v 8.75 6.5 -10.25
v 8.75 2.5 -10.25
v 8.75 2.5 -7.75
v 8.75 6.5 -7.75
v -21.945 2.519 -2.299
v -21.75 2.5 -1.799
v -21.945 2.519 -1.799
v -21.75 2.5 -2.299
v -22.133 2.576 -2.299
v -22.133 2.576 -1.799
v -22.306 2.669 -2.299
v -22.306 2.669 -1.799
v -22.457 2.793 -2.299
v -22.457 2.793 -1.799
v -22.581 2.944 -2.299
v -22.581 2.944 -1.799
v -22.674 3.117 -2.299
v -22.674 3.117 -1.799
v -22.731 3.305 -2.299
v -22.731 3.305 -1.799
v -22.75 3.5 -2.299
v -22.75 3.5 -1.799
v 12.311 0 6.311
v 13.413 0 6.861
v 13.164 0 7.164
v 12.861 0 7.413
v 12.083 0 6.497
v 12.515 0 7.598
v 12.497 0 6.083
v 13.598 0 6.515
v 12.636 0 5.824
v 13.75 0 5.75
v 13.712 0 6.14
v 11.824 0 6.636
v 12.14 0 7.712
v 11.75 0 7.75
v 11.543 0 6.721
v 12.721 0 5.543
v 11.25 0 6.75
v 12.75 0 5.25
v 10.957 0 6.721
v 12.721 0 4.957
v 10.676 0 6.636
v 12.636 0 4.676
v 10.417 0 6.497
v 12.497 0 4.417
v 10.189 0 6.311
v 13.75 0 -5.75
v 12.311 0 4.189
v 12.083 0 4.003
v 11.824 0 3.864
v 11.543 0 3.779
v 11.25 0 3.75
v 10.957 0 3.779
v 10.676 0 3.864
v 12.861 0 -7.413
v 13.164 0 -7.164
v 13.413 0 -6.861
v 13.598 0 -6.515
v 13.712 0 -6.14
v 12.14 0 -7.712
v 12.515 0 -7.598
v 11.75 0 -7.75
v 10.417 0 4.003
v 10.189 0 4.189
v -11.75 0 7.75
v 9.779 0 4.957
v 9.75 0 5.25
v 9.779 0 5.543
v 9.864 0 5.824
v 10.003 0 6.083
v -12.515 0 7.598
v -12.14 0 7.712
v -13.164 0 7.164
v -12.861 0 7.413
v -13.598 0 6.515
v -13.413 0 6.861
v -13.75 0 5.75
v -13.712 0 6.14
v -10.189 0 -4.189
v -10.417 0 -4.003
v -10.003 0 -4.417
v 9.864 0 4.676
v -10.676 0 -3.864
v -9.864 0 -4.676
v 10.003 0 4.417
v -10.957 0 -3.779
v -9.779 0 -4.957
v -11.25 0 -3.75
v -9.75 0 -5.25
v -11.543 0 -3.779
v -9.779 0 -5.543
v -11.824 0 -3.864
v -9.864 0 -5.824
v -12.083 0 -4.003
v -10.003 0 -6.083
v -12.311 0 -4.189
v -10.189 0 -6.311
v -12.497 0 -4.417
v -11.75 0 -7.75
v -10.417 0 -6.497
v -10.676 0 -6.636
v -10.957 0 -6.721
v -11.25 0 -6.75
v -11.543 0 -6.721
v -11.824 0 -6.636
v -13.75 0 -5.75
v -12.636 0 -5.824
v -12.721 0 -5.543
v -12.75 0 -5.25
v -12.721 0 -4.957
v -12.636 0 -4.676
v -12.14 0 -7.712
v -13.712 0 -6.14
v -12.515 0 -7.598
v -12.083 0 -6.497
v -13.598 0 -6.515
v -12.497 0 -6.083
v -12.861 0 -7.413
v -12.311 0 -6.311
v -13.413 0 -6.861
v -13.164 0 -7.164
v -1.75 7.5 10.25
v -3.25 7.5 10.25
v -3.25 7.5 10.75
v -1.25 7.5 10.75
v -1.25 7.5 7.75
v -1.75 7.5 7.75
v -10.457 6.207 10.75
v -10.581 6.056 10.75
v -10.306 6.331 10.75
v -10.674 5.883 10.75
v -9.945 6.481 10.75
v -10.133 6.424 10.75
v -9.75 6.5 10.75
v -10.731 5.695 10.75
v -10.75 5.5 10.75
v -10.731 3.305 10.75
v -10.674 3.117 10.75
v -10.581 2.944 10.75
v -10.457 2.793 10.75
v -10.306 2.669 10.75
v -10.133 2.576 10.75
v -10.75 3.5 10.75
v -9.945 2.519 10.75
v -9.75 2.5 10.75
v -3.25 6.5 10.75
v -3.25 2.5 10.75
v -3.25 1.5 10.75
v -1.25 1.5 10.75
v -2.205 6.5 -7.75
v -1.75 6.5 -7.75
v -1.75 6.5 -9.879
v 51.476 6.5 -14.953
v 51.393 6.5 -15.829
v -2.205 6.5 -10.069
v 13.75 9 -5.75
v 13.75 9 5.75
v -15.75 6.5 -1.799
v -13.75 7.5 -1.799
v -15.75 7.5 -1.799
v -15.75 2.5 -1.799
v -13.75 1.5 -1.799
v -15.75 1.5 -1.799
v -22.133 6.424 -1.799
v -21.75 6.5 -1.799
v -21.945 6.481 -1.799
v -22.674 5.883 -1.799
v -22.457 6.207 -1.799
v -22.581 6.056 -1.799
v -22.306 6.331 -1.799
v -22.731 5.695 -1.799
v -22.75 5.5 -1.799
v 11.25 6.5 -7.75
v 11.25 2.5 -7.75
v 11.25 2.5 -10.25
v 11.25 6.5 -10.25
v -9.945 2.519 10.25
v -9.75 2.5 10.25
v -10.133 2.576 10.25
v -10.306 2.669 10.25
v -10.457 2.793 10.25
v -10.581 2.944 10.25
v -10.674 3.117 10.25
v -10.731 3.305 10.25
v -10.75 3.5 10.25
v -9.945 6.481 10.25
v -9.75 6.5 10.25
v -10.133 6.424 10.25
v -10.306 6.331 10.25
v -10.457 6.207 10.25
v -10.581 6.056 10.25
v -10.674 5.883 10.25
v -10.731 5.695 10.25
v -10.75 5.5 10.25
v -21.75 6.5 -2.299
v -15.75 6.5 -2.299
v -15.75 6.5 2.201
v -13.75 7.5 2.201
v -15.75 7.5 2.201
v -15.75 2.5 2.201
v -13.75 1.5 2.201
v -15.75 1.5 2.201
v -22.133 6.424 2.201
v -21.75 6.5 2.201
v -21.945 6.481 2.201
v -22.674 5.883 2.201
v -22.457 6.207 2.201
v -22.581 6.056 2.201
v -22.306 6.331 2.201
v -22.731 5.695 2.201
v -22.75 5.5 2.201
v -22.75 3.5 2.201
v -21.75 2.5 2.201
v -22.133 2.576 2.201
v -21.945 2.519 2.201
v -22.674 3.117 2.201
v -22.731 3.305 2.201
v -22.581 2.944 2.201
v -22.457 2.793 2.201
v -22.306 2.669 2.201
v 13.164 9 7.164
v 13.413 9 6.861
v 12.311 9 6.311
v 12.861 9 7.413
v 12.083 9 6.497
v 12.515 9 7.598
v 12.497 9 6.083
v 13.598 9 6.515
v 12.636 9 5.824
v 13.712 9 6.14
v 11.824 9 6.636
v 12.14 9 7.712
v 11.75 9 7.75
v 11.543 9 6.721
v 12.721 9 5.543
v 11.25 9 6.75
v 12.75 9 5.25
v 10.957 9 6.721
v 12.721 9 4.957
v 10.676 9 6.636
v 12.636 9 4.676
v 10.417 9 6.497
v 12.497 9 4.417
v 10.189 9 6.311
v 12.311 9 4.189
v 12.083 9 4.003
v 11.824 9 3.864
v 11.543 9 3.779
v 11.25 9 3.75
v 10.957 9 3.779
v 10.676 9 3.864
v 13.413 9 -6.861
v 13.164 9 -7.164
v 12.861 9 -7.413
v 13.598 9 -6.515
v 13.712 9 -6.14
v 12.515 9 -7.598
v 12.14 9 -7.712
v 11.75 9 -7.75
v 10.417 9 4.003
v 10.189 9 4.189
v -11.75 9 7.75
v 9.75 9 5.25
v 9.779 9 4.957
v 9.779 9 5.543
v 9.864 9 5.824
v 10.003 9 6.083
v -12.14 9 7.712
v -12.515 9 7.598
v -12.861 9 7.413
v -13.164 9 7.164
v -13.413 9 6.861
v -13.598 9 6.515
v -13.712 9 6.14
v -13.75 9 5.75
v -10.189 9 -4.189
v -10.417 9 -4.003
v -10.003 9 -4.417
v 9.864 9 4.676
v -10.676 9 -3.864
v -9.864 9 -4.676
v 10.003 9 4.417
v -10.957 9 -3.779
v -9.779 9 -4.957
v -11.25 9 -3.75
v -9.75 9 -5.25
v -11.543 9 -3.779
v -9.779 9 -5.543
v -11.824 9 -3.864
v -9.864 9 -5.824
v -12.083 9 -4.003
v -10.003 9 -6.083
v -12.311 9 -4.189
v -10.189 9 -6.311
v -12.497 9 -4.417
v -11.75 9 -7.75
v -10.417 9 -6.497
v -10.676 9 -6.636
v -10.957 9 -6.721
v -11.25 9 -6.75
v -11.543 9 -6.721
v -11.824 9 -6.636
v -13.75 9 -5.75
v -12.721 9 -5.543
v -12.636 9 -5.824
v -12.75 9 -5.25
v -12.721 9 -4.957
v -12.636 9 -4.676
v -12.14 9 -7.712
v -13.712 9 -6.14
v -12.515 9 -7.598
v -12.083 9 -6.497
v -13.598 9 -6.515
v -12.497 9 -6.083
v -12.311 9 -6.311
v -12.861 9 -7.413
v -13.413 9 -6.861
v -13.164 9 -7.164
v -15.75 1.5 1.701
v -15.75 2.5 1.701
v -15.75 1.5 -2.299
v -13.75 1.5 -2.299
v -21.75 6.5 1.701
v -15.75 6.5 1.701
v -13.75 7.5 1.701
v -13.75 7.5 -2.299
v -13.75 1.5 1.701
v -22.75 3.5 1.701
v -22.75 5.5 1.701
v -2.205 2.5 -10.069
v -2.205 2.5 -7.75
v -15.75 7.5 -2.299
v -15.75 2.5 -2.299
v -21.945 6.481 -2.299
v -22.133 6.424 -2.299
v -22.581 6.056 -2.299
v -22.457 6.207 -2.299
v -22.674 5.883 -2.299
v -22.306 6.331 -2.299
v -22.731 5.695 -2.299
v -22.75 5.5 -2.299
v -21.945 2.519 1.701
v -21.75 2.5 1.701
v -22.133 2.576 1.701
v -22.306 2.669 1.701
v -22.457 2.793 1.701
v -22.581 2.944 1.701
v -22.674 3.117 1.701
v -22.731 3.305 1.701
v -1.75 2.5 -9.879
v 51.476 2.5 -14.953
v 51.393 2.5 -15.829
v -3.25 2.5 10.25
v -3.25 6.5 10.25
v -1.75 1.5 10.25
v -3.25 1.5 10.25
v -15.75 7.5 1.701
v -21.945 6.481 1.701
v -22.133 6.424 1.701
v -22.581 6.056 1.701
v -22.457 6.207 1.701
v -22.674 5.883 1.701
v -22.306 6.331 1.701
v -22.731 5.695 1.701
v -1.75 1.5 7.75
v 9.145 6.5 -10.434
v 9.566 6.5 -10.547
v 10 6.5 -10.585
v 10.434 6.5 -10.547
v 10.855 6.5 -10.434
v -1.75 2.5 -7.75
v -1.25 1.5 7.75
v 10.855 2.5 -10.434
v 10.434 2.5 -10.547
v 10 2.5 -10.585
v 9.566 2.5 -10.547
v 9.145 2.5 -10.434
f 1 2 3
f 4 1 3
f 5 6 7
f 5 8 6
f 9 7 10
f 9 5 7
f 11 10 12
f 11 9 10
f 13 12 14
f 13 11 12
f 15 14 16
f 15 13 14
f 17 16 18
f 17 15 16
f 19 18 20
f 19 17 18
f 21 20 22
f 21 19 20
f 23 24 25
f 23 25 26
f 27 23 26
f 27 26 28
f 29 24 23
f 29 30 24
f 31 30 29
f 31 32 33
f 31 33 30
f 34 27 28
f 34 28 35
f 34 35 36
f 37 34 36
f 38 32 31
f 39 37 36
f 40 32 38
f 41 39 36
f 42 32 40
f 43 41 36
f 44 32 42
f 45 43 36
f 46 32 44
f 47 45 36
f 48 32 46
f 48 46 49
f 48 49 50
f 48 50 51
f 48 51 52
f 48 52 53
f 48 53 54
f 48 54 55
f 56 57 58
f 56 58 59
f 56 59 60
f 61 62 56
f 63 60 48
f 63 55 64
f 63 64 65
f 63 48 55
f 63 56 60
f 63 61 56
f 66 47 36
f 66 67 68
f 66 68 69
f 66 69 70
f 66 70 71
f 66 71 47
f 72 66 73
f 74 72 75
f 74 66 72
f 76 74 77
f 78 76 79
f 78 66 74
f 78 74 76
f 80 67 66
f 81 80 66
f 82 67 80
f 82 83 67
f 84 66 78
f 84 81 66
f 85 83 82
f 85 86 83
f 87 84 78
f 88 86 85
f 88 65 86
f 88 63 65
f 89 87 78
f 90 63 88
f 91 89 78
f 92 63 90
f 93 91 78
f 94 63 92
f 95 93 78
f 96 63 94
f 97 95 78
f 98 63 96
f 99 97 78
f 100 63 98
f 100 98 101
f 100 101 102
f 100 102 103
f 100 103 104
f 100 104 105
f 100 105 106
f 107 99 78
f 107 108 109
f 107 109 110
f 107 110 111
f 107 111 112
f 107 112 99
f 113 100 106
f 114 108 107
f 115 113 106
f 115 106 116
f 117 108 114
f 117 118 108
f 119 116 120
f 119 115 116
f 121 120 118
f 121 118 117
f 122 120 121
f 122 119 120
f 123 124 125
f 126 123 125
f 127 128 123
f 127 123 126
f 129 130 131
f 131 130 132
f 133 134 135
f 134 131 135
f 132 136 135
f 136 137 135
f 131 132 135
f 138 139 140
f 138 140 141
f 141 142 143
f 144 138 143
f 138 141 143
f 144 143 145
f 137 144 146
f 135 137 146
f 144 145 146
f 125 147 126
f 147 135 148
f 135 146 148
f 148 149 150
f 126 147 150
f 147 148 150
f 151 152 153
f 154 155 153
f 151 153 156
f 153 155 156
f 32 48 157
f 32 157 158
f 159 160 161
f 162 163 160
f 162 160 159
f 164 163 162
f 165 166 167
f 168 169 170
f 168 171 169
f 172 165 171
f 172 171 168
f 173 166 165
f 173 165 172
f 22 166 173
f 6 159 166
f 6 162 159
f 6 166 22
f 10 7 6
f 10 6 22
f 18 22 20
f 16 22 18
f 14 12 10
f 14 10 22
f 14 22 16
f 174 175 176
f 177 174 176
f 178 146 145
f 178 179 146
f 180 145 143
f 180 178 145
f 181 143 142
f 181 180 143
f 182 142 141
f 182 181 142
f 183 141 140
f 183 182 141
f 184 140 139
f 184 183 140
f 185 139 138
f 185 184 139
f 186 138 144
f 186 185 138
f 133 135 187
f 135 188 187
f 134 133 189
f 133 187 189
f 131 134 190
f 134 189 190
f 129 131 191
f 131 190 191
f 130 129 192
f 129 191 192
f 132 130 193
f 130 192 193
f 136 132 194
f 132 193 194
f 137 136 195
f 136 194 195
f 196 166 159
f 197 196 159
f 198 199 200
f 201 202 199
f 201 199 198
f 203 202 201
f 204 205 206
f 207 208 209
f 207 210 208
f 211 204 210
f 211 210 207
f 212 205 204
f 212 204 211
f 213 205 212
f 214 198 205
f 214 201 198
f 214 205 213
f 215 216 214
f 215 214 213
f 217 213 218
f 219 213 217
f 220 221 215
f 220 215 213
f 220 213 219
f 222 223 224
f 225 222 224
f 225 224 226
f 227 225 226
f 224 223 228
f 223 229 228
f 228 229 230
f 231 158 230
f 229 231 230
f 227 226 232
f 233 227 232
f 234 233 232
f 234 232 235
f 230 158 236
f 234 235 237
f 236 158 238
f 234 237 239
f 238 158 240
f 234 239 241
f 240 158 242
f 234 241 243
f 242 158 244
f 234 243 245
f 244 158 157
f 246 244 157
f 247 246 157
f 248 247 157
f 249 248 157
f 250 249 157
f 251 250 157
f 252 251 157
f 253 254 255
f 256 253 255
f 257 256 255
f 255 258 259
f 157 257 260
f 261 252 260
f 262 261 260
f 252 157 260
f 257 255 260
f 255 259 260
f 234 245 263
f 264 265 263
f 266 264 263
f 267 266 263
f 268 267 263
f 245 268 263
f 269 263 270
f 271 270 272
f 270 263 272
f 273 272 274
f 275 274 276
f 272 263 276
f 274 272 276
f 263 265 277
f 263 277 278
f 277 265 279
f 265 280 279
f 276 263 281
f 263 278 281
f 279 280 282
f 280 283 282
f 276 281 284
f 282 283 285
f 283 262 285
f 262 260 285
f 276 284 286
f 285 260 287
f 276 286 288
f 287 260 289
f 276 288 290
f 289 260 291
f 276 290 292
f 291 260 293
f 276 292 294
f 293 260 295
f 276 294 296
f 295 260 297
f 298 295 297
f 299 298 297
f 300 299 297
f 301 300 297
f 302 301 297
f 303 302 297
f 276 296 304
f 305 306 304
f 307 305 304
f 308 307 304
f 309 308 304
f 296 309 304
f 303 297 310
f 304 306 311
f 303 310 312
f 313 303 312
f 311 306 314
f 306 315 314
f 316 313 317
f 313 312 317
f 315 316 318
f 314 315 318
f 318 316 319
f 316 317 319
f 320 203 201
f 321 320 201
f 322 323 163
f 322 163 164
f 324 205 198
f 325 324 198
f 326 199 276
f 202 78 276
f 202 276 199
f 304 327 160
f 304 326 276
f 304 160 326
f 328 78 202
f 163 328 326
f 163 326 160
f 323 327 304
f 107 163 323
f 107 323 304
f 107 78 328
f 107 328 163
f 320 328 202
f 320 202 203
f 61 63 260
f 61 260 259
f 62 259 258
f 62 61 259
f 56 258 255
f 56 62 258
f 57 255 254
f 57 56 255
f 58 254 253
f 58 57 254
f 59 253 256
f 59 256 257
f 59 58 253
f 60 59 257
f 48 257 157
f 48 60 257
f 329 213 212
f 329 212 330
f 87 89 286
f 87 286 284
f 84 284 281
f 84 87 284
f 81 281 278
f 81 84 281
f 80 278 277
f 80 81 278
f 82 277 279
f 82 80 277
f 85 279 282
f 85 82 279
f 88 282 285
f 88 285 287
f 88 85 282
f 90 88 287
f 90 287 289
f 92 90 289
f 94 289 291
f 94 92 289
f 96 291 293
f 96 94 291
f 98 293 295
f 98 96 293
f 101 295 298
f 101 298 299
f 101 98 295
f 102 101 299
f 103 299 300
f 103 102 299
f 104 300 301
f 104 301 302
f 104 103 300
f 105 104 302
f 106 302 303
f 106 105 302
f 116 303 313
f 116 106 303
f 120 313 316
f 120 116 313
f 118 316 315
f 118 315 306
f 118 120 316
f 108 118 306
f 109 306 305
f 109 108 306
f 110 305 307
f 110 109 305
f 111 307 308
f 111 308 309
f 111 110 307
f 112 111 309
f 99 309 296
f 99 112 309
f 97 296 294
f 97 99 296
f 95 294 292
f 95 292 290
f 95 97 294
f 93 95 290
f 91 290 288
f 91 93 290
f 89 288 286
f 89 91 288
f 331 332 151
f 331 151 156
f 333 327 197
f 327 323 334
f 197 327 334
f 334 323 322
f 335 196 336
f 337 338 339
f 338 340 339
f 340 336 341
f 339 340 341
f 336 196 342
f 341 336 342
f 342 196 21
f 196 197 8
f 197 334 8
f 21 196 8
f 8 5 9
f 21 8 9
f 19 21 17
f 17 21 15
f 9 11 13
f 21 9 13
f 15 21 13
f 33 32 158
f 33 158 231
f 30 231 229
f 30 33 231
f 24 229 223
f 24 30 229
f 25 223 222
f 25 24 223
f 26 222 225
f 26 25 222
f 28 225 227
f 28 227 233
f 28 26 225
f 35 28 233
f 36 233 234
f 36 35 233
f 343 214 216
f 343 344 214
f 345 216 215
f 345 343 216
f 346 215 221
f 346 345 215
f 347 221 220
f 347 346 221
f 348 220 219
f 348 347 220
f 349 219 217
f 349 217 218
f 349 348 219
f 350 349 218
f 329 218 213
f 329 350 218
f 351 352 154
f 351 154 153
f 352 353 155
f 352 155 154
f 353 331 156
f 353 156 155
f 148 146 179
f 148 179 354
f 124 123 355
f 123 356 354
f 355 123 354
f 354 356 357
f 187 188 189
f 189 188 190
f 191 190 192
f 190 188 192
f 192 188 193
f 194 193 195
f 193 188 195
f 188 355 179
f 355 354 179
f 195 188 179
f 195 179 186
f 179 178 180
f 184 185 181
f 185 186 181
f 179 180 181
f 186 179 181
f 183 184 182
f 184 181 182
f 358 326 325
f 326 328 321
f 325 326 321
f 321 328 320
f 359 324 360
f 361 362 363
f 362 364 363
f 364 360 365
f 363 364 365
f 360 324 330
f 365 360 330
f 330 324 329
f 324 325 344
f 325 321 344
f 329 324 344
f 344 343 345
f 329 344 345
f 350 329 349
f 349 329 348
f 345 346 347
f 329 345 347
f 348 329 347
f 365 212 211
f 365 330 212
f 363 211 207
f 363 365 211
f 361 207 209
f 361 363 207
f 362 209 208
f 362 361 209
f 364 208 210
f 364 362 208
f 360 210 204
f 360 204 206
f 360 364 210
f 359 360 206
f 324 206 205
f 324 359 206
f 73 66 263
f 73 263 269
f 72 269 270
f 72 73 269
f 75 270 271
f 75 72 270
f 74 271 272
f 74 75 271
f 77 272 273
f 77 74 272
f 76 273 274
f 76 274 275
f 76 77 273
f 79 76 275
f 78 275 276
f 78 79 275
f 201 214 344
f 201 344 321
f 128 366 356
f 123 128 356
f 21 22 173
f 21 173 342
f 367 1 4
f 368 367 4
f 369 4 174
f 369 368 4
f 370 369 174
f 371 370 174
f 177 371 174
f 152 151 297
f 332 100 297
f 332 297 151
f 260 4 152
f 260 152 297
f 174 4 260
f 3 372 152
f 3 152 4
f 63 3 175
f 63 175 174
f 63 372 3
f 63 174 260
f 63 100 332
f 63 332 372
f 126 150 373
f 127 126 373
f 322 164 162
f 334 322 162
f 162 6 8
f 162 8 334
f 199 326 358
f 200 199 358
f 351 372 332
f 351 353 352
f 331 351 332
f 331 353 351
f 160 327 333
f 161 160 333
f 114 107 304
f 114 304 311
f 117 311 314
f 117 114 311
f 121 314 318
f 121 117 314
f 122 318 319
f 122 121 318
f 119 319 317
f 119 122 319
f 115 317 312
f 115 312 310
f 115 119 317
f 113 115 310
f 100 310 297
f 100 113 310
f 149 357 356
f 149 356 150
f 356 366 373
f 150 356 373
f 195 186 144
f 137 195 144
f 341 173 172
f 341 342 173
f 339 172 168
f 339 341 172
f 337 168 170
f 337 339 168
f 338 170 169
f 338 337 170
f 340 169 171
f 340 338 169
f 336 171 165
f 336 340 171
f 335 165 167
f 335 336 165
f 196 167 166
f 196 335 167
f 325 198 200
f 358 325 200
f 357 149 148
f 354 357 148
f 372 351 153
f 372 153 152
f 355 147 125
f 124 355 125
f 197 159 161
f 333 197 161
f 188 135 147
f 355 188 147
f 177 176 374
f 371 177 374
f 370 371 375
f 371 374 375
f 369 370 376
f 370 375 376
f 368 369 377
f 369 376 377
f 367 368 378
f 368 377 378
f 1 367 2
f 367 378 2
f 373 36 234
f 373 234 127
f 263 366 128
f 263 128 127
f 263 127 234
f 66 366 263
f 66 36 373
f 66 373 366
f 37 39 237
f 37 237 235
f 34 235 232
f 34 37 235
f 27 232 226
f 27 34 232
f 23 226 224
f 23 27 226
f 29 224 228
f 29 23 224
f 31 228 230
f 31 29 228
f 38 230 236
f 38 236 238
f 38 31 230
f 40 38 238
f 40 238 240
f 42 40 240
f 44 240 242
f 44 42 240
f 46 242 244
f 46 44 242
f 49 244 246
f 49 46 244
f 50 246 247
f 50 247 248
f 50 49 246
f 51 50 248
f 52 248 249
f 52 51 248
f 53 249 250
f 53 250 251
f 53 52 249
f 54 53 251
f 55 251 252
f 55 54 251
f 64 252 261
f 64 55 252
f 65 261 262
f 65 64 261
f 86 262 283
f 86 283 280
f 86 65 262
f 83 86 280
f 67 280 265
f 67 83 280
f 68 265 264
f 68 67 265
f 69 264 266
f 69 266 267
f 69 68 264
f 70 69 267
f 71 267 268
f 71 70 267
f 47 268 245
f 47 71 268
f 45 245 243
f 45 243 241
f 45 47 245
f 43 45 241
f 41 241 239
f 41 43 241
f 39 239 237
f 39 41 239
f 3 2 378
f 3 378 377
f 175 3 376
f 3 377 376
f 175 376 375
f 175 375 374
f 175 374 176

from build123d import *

# Parameters (mm, degrees)
SKETCH1_R            = 1.5
BOSS_EXTRUDE1_DEPTH  = 9
BOSS_EXTRUDE2_DEPTH  = 4
BOSS_EXTRUDE9_DEPTH  = 4
SKETCH5_W            = 9
SKETCH5_H            = 0.5
BOSS_EXTRUDE10_DEPTH = 6
SKETCH6_W            = 7.5
SKETCH6_H            = 1
CUT_EXTRUDE1_DEPTH   = 2
SKETCH7_W            = 7
SKETCH7_H            = 1
CUT_EXTRUDE2_DEPTH   = 5
FILLET1_R            = 1


with BuildPart() as part:
    # Sketch1 → Boss-Extrude1 (new body)
    with BuildSketch(Plane(origin=(0, 0, 0), x_dir=(1, 0, 0), z_dir=(0, 1, 0))):
        with BuildLine():
            Line((11.75, -7.75), (-11.75, -7.75))
            ThreePointArc((-11.75, -7.75), (-13.164213562, -7.164213562), (-13.75, -5.75))
            Line((-13.75, -5.75), (-13.75, 5.75))
            ThreePointArc((-13.75, 5.75), (-13.164213562, 7.164213562), (-11.75, 7.75))
            Line((-11.75, 7.75), (11.75, 7.75))
            ThreePointArc((11.75, 7.75), (13.164213562, 7.164213562), (13.75, 5.75))
            Line((13.75, 5.75), (13.75, -5.75))
            ThreePointArc((13.75, -5.75), (13.164213562, -7.164213562), (11.75, -7.75))
        make_face()
        with Locations(Location((-11.25, 5.25, 0), (0, 0, 270))):
            Circle(SKETCH1_R, mode=Mode.SUBTRACT)
        with Locations(Location((11.25, -5.25, 0), (0, 0, 270))):
            Circle(SKETCH1_R, mode=Mode.SUBTRACT)
    extrude(amount=BOSS_EXTRUDE1_DEPTH)

    # Sketch3 → Boss-Extrude2 (add)
    with BuildSketch(Plane(origin=(0, 2.5, 0), x_dir=(-1, 0, 0), z_dir=(0, -1, 0))):
        with BuildLine():
            Line((-11.25, 7.75), (-11.25, 10.25))
            ThreePointArc((-11.25, 10.25), (-10, 10.584936491), (-8.75, 10.25))
            Line((-8.75, 10.25), (-8.75, 7.75))
            Line((-8.75, 7.75), (-11.25, 7.75))
        make_face()
    extrude(amount=-BOSS_EXTRUDE2_DEPTH)

    # Sketch4 → Boss-Extrude9 (add)
    with BuildSketch(Plane(origin=(0, 2.5, 0), x_dir=(-1, 0, 0), z_dir=(0, -1, 0))):
        Polygon((1.75, 7.75), (2.205022523, 7.75), (2.205022523, 10.069490078), (-51.392713573, 15.829296812), (-51.47623297, 14.95318025), (1.75, 9.879171754), align=None)
    extrude(amount=-BOSS_EXTRUDE9_DEPTH)

    # Sketch5 → Boss-Extrude10 (add)
    with BuildSketch(Plane(origin=(0, 1.5, 0), x_dir=(-1, 0, 0), z_dir=(0, -1, 0))):
        Polygon((1.75, -7.75), (1.75, -10.25), (10.75, -10.25), (10.75, -10.75), (1.25, -10.75), (1.25, -7.75), align=None)
        with Locations((18.25, 2.049029433)):
            Rectangle(SKETCH5_W, SKETCH5_H)
        with Locations((18.25, -1.950970567)):
            Rectangle(SKETCH5_W, SKETCH5_H)
    extrude(amount=-BOSS_EXTRUDE10_DEPTH)

    # Sketch6 → Cut-Extrude1 (cut)
    with BuildSketch(Plane.XY.offset(10.75)):
        with Locations((-7, 2)):
            Rectangle(SKETCH6_W, SKETCH6_H)
        with Locations((-7, 7)):
            Rectangle(SKETCH6_W, SKETCH6_H)
    extrude(amount=-CUT_EXTRUDE1_DEPTH, mode=Mode.SUBTRACT)

    # Sketch7 → Cut-Extrude2 (cut)
    with BuildSketch(Plane.XY.offset(2.200970567)):
        with Locations((-19.25, 2)):
            Rectangle(SKETCH7_W, SKETCH7_H)
        with Locations((-19.25, 7)):
            Rectangle(SKETCH7_W, SKETCH7_H)
    extrude(amount=-CUT_EXTRUDE2_DEPTH, mode=Mode.SUBTRACT)

    # Fillet1
    fillet1_edges = [part.edges().sort_by_distance(p)[0] for p in [
        (-10.75, 2.5, 10.5),
        (-10.75, 6.5, 10.5),
        (-22.75, 2.5, -2.049029433),
        (-22.75, 2.5, 1.950970567),
        (-22.75, 6.5, -2.049029433),
        (-22.75, 6.5, 1.950970567),
    ]]
    fillet(fillet1_edges, radius=FILLET1_R)


solid = part.part
